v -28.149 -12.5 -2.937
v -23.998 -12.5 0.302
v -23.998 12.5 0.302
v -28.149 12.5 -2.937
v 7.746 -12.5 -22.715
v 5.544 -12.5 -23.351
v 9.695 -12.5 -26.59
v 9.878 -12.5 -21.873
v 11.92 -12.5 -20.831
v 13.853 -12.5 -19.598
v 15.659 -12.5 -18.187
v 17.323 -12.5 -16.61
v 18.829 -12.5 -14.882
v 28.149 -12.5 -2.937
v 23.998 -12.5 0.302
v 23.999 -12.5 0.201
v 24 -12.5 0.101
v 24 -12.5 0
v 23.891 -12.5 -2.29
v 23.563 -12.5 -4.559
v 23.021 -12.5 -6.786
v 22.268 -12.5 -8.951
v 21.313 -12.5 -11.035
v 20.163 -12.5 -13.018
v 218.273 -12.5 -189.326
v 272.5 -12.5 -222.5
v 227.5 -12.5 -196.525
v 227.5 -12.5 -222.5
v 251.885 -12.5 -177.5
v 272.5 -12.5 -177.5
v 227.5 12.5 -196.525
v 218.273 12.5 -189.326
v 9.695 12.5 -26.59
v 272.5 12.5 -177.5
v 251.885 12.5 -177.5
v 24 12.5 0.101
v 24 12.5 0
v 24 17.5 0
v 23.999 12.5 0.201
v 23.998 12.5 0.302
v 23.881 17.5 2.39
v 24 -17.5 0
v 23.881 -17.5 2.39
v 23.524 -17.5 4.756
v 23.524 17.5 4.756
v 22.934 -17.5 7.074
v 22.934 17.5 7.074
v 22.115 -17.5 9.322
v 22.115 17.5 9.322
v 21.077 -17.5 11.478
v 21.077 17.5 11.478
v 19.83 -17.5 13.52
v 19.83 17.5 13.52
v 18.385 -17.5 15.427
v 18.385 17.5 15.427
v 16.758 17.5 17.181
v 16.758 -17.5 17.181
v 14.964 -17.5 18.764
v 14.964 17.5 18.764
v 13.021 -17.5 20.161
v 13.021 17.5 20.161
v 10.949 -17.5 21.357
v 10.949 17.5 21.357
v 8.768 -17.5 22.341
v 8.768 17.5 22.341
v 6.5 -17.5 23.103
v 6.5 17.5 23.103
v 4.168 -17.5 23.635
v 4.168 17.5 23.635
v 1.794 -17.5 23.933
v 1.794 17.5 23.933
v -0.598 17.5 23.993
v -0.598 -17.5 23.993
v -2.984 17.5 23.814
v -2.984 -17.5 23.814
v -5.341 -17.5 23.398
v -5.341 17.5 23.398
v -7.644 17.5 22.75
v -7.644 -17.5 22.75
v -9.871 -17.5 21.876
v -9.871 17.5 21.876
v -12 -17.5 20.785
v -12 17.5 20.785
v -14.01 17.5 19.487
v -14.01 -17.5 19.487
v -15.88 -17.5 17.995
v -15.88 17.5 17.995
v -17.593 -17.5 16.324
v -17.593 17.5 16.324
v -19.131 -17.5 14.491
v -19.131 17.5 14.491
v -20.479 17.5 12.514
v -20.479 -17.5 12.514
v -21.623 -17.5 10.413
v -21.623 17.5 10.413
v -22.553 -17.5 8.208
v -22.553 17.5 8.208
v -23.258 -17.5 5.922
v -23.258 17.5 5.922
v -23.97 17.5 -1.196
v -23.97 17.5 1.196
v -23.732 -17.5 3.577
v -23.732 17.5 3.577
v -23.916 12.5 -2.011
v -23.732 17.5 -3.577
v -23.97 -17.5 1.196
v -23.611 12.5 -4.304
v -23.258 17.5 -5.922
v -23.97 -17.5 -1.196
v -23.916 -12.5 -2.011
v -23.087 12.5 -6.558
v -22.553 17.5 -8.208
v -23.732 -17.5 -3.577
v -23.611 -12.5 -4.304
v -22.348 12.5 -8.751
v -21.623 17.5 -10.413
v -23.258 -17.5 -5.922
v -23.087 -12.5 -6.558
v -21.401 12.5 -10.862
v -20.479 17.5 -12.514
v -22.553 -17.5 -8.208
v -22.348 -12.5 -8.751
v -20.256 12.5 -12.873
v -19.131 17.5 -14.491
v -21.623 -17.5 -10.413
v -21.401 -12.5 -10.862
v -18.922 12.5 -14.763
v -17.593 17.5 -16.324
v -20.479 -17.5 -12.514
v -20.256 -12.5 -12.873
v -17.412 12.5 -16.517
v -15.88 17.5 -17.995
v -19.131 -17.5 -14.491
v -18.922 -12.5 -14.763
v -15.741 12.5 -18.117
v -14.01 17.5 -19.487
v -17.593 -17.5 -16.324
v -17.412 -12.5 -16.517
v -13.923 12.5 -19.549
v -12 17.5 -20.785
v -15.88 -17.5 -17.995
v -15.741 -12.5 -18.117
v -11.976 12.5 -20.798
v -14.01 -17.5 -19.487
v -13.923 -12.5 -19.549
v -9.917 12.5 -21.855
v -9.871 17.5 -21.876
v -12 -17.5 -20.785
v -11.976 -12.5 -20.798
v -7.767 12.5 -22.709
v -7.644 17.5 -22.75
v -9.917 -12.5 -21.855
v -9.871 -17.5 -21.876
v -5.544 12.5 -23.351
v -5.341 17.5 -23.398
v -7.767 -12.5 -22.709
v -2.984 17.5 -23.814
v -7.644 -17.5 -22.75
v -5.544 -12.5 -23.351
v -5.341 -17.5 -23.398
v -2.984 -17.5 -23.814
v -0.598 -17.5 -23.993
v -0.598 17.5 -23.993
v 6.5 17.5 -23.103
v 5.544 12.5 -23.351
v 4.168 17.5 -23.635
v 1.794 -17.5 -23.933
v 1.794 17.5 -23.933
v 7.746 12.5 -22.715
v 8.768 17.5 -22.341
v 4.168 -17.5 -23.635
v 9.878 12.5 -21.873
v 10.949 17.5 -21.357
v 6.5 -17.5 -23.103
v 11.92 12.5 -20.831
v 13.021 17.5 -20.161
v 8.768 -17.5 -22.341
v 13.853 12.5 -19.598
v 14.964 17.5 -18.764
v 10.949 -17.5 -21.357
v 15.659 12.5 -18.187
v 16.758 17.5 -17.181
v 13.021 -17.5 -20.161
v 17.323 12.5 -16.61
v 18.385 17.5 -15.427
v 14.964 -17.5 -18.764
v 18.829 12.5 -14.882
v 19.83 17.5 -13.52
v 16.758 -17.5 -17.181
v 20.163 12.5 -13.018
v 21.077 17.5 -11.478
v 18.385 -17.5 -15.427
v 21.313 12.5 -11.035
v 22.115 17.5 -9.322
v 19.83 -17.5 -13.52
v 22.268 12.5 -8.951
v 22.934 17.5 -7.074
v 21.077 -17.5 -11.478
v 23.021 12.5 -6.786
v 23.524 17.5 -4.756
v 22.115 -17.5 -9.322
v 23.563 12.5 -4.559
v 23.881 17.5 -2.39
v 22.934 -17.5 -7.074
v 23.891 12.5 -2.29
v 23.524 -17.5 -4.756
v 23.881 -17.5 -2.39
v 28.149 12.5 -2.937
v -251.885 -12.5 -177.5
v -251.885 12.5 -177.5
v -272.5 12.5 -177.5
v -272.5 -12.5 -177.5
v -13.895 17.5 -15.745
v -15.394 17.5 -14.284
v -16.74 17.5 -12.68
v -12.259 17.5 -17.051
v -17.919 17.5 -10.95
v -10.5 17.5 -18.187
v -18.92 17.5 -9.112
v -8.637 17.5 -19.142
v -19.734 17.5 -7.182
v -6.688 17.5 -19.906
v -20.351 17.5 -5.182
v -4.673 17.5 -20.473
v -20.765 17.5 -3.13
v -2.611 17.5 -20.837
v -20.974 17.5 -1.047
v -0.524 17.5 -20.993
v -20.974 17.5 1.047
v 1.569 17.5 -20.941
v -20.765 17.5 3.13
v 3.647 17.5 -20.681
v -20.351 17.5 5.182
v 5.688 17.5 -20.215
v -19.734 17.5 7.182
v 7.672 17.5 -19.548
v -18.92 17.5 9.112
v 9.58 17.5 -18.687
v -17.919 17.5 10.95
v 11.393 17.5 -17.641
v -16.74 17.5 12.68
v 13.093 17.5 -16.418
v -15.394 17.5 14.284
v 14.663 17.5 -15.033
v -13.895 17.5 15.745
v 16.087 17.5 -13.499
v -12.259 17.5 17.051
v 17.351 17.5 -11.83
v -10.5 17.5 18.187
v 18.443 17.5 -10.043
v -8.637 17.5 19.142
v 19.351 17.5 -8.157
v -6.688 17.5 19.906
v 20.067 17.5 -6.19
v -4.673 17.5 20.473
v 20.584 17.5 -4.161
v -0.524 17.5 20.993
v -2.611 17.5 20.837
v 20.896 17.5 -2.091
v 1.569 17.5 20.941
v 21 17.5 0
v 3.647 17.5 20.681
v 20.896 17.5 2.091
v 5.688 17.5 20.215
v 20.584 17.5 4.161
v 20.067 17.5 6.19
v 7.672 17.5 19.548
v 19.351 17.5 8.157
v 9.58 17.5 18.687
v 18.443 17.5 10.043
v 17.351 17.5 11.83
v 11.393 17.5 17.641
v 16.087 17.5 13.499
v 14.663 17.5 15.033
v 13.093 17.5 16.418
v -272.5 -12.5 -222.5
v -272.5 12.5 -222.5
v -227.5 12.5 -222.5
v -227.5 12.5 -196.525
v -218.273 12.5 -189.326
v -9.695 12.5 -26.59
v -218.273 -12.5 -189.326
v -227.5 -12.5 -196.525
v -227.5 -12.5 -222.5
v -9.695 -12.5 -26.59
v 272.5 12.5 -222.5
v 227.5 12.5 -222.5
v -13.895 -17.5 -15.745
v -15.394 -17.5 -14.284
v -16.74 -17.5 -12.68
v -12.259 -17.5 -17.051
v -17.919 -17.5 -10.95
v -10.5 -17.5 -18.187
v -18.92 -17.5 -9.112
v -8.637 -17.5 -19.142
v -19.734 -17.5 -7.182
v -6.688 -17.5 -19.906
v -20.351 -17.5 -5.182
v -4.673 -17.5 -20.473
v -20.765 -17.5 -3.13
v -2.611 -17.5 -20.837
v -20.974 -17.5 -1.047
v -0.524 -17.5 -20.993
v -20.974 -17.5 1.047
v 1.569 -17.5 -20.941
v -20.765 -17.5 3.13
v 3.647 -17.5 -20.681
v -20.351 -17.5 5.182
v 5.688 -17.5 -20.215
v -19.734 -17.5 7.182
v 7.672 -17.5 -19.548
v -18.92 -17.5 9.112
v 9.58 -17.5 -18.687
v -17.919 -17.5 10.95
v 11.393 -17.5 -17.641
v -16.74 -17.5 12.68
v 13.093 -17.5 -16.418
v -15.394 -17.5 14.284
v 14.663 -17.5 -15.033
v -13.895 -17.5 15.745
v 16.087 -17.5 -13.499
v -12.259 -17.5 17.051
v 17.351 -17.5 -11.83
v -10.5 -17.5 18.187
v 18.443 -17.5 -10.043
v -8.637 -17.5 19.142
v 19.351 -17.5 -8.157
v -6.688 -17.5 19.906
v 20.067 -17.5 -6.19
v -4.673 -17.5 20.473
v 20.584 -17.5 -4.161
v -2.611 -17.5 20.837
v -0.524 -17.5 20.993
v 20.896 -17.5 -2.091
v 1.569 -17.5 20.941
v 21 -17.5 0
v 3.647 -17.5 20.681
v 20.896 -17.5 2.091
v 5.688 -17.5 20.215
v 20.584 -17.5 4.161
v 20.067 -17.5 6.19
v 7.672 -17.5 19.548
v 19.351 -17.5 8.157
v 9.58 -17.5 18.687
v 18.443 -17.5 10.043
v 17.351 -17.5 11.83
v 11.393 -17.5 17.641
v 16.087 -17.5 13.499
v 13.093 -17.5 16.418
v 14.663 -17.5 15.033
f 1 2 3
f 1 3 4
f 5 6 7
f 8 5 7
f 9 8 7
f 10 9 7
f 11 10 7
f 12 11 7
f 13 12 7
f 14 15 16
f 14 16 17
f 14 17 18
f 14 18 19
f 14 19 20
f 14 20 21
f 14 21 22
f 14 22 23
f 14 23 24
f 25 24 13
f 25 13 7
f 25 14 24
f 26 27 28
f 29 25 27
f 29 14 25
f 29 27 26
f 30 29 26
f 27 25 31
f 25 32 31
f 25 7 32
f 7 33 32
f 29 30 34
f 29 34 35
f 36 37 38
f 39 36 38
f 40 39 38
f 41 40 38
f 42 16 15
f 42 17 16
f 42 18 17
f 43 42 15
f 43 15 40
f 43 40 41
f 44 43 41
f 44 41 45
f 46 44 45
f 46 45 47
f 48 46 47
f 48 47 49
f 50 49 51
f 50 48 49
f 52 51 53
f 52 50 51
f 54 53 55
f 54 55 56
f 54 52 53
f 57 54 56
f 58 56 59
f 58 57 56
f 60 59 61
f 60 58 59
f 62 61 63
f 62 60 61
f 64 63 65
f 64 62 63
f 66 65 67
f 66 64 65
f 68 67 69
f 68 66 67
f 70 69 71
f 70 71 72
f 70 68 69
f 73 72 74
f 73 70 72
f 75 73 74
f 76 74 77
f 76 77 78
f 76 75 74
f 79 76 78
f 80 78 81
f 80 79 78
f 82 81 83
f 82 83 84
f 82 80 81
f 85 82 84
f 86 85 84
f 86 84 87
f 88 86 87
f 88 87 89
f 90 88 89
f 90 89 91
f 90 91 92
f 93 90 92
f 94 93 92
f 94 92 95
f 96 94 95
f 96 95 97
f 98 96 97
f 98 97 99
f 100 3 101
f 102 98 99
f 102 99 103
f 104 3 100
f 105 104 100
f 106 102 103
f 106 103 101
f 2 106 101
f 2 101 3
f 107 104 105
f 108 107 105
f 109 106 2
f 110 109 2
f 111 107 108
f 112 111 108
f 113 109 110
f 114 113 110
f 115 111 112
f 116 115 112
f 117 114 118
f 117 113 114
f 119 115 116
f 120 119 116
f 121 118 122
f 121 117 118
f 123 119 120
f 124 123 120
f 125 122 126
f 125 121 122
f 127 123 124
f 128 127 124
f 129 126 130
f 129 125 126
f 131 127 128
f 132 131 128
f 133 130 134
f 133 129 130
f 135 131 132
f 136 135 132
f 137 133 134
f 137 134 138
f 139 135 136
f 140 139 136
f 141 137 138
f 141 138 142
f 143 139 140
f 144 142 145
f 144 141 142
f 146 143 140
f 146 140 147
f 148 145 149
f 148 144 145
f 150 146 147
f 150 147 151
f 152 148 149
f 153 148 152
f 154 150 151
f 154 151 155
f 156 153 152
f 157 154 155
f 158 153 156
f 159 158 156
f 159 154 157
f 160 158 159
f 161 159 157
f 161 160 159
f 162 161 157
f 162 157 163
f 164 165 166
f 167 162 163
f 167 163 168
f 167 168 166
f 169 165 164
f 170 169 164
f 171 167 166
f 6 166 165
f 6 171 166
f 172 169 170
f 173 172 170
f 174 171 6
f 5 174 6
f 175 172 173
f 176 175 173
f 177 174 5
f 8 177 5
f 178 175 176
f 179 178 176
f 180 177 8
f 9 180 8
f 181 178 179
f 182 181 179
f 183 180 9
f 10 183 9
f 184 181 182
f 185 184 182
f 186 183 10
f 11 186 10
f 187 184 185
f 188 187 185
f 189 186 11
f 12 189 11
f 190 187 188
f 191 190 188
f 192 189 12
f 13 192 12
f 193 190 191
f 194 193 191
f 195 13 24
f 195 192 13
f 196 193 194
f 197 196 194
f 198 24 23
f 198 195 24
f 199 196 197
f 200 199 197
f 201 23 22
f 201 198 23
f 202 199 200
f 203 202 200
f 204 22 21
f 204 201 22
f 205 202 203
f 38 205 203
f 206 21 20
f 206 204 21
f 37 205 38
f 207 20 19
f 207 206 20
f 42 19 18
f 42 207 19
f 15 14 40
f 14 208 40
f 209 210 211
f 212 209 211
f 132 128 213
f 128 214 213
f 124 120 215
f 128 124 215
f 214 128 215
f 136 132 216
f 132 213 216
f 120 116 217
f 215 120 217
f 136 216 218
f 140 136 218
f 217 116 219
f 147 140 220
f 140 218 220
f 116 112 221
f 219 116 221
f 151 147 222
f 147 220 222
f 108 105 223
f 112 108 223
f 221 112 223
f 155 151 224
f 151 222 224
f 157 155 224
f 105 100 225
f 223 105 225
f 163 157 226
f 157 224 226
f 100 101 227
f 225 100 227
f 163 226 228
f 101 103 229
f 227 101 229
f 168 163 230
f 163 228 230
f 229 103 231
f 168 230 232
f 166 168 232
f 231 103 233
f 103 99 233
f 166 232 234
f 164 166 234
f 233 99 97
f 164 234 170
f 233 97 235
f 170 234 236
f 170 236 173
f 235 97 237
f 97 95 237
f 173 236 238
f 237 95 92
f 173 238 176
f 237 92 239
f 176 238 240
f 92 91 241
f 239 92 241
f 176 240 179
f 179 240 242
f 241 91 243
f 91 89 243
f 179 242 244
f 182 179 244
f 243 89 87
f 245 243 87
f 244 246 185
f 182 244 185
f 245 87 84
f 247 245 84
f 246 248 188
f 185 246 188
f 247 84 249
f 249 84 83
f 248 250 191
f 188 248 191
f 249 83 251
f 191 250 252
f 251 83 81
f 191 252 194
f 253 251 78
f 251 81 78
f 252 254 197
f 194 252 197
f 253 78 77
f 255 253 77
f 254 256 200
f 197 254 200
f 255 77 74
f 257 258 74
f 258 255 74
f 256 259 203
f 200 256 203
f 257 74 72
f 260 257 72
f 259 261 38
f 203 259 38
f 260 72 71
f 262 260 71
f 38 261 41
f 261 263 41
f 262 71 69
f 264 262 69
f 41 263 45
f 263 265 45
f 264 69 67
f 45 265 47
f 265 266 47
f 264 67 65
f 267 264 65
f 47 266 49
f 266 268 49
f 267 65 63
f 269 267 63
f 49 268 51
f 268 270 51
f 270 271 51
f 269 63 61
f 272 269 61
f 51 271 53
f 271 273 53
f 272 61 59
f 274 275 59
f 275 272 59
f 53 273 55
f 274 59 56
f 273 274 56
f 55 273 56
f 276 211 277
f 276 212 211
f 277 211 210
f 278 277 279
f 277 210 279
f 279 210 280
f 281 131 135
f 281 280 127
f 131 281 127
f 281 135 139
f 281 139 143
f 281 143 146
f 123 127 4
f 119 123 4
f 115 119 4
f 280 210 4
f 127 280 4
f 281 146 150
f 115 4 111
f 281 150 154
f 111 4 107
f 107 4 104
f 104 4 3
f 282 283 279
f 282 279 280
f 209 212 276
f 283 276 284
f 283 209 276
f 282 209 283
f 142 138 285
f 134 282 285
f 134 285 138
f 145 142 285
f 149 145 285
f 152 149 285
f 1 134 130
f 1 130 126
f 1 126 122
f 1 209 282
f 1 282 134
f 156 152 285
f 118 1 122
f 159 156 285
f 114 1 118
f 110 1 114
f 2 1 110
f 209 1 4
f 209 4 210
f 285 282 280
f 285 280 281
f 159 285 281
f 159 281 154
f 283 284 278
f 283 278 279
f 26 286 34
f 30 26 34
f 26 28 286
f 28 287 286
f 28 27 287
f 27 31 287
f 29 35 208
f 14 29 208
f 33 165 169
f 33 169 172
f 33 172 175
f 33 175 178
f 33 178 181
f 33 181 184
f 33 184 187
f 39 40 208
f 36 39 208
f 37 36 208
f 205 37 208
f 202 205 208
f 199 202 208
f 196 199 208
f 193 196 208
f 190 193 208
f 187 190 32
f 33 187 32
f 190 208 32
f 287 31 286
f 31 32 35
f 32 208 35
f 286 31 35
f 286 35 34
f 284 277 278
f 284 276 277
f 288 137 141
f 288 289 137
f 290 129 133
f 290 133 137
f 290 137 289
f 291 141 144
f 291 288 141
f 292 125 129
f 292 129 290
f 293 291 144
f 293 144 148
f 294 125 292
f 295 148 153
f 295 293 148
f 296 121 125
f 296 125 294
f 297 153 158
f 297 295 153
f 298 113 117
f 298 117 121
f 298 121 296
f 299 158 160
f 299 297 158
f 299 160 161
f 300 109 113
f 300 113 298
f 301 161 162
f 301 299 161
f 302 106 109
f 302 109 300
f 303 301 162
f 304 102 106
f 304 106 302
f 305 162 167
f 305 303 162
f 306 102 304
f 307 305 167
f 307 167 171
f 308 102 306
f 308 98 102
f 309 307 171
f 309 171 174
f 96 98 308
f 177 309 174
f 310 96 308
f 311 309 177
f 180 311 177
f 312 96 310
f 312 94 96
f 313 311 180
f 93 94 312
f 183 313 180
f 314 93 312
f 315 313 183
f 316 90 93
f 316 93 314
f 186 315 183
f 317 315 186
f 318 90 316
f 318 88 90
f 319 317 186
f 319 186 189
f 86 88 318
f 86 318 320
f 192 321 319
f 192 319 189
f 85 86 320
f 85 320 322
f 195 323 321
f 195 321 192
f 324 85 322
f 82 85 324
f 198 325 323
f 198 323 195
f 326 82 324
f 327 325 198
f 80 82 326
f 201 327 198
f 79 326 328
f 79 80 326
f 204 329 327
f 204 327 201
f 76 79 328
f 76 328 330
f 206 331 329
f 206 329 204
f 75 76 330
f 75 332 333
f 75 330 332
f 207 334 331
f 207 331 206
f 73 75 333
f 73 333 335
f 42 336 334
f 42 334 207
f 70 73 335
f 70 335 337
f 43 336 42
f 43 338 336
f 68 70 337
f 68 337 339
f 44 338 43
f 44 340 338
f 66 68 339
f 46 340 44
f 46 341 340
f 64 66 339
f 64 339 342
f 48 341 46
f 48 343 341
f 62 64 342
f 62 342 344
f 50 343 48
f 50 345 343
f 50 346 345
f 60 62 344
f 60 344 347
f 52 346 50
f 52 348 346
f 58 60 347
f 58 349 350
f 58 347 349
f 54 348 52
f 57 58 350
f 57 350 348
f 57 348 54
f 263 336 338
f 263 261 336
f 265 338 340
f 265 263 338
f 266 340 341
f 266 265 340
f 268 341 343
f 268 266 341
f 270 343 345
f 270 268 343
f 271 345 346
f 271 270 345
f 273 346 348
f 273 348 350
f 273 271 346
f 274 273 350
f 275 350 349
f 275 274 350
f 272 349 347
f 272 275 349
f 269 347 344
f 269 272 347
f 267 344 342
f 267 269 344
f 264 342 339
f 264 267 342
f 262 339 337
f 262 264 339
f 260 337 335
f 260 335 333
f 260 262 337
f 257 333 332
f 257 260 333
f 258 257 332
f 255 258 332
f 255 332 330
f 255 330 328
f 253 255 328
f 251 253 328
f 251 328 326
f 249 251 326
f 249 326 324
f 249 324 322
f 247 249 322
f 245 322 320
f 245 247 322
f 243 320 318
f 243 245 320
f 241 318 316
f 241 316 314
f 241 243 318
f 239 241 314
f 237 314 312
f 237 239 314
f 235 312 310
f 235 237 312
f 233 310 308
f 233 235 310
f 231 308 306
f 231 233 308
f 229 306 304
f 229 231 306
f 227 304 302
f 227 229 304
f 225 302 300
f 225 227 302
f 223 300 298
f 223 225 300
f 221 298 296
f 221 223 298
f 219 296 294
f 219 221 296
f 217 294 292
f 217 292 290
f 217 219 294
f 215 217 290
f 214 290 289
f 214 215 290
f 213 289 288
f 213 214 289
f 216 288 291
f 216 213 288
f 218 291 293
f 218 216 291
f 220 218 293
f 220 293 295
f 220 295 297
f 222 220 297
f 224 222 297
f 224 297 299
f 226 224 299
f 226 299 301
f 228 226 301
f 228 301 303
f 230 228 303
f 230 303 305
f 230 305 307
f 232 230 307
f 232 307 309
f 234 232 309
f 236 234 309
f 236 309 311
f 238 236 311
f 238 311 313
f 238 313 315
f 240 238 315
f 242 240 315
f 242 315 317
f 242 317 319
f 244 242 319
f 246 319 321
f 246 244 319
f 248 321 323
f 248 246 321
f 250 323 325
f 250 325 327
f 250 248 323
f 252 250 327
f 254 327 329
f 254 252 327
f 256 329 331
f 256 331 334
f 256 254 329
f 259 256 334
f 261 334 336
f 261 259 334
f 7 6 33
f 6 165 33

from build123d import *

# Parameters (mm, degrees)
F0_R     = 24
F0_R_2   = 21
F1_DEPTH = 17.5
F3_DEPTH = 12.5


with BuildPart() as f1:
    # F0 (on Front) → F1 (new body, symmetric)
    with BuildSketch(Plane.XZ):
        Circle(F0_R)
        Circle(F0_R_2, mode=Mode.SUBTRACT)
    extrude(amount=F1_DEPTH, both=True)

    # F2 (on Front) → F3 (join, symmetric)
    with BuildSketch(Plane.XZ):
        with BuildLine():
            Line((251.8847116829, -177.5), (236.7270928985, -165.6737260034))
            Line((236.7270928985, -165.6737260034), (28.1491312931, -2.9370746409))
            Line((28.1491312931, -2.9370746409), (23.9981043859, 0.3016386602))
            ThreePointArc((23.9981043859, 0.3016386602), (18.9220383946, -14.7633486375), (5.543918589, -23.350909333))
            Line((5.543918589, -23.350909333), (9.6949454961, -26.5896226342))
            Line((9.6949454961, -26.5896226342), (218.2729071015, -189.3262739966))
            Line((218.2729071015, -189.3262739966), (227.5, -196.5254343899))
            Line((227.5, -196.5254343899), (227.5, -222.5))
            Line((227.5, -222.5), (272.5, -222.5))
            Line((272.5, -222.5), (272.5, -177.5))
            Line((272.5, -177.5), (251.8847116829, -177.5))
        make_face()
        with BuildLine():
            Line((-272.5, -222.5), (-227.5, -222.5))
            Line((-227.5, -222.5), (-227.5, -196.5254343899))
            Line((-227.5, -196.5254343899), (-218.2729071015, -189.3262739966))
            Line((-218.2729071015, -189.3262739966), (-9.6949454961, -26.5896226342))
            Line((-9.6949454961, -26.5896226342), (-5.543918589, -23.350909333))
            ThreePointArc((-5.543918589, -23.350909333), (-18.9220383946, -14.7633486375), (-23.9981043859, 0.3016386602))
            Line((-23.9981043859, 0.3016386602), (-28.1491312931, -2.9370746409))
            Line((-28.1491312931, -2.9370746409), (-236.7270928985, -165.6737260034))
            Line((-236.7270928985, -165.6737260034), (-251.8847116829, -177.5))
            Line((-251.8847116829, -177.5), (-272.5, -177.5))
            Line((-272.5, -177.5), (-272.5, -222.5))
        make_face()
    extrude(amount=F3_DEPTH, both=True)


solid = f1.part
